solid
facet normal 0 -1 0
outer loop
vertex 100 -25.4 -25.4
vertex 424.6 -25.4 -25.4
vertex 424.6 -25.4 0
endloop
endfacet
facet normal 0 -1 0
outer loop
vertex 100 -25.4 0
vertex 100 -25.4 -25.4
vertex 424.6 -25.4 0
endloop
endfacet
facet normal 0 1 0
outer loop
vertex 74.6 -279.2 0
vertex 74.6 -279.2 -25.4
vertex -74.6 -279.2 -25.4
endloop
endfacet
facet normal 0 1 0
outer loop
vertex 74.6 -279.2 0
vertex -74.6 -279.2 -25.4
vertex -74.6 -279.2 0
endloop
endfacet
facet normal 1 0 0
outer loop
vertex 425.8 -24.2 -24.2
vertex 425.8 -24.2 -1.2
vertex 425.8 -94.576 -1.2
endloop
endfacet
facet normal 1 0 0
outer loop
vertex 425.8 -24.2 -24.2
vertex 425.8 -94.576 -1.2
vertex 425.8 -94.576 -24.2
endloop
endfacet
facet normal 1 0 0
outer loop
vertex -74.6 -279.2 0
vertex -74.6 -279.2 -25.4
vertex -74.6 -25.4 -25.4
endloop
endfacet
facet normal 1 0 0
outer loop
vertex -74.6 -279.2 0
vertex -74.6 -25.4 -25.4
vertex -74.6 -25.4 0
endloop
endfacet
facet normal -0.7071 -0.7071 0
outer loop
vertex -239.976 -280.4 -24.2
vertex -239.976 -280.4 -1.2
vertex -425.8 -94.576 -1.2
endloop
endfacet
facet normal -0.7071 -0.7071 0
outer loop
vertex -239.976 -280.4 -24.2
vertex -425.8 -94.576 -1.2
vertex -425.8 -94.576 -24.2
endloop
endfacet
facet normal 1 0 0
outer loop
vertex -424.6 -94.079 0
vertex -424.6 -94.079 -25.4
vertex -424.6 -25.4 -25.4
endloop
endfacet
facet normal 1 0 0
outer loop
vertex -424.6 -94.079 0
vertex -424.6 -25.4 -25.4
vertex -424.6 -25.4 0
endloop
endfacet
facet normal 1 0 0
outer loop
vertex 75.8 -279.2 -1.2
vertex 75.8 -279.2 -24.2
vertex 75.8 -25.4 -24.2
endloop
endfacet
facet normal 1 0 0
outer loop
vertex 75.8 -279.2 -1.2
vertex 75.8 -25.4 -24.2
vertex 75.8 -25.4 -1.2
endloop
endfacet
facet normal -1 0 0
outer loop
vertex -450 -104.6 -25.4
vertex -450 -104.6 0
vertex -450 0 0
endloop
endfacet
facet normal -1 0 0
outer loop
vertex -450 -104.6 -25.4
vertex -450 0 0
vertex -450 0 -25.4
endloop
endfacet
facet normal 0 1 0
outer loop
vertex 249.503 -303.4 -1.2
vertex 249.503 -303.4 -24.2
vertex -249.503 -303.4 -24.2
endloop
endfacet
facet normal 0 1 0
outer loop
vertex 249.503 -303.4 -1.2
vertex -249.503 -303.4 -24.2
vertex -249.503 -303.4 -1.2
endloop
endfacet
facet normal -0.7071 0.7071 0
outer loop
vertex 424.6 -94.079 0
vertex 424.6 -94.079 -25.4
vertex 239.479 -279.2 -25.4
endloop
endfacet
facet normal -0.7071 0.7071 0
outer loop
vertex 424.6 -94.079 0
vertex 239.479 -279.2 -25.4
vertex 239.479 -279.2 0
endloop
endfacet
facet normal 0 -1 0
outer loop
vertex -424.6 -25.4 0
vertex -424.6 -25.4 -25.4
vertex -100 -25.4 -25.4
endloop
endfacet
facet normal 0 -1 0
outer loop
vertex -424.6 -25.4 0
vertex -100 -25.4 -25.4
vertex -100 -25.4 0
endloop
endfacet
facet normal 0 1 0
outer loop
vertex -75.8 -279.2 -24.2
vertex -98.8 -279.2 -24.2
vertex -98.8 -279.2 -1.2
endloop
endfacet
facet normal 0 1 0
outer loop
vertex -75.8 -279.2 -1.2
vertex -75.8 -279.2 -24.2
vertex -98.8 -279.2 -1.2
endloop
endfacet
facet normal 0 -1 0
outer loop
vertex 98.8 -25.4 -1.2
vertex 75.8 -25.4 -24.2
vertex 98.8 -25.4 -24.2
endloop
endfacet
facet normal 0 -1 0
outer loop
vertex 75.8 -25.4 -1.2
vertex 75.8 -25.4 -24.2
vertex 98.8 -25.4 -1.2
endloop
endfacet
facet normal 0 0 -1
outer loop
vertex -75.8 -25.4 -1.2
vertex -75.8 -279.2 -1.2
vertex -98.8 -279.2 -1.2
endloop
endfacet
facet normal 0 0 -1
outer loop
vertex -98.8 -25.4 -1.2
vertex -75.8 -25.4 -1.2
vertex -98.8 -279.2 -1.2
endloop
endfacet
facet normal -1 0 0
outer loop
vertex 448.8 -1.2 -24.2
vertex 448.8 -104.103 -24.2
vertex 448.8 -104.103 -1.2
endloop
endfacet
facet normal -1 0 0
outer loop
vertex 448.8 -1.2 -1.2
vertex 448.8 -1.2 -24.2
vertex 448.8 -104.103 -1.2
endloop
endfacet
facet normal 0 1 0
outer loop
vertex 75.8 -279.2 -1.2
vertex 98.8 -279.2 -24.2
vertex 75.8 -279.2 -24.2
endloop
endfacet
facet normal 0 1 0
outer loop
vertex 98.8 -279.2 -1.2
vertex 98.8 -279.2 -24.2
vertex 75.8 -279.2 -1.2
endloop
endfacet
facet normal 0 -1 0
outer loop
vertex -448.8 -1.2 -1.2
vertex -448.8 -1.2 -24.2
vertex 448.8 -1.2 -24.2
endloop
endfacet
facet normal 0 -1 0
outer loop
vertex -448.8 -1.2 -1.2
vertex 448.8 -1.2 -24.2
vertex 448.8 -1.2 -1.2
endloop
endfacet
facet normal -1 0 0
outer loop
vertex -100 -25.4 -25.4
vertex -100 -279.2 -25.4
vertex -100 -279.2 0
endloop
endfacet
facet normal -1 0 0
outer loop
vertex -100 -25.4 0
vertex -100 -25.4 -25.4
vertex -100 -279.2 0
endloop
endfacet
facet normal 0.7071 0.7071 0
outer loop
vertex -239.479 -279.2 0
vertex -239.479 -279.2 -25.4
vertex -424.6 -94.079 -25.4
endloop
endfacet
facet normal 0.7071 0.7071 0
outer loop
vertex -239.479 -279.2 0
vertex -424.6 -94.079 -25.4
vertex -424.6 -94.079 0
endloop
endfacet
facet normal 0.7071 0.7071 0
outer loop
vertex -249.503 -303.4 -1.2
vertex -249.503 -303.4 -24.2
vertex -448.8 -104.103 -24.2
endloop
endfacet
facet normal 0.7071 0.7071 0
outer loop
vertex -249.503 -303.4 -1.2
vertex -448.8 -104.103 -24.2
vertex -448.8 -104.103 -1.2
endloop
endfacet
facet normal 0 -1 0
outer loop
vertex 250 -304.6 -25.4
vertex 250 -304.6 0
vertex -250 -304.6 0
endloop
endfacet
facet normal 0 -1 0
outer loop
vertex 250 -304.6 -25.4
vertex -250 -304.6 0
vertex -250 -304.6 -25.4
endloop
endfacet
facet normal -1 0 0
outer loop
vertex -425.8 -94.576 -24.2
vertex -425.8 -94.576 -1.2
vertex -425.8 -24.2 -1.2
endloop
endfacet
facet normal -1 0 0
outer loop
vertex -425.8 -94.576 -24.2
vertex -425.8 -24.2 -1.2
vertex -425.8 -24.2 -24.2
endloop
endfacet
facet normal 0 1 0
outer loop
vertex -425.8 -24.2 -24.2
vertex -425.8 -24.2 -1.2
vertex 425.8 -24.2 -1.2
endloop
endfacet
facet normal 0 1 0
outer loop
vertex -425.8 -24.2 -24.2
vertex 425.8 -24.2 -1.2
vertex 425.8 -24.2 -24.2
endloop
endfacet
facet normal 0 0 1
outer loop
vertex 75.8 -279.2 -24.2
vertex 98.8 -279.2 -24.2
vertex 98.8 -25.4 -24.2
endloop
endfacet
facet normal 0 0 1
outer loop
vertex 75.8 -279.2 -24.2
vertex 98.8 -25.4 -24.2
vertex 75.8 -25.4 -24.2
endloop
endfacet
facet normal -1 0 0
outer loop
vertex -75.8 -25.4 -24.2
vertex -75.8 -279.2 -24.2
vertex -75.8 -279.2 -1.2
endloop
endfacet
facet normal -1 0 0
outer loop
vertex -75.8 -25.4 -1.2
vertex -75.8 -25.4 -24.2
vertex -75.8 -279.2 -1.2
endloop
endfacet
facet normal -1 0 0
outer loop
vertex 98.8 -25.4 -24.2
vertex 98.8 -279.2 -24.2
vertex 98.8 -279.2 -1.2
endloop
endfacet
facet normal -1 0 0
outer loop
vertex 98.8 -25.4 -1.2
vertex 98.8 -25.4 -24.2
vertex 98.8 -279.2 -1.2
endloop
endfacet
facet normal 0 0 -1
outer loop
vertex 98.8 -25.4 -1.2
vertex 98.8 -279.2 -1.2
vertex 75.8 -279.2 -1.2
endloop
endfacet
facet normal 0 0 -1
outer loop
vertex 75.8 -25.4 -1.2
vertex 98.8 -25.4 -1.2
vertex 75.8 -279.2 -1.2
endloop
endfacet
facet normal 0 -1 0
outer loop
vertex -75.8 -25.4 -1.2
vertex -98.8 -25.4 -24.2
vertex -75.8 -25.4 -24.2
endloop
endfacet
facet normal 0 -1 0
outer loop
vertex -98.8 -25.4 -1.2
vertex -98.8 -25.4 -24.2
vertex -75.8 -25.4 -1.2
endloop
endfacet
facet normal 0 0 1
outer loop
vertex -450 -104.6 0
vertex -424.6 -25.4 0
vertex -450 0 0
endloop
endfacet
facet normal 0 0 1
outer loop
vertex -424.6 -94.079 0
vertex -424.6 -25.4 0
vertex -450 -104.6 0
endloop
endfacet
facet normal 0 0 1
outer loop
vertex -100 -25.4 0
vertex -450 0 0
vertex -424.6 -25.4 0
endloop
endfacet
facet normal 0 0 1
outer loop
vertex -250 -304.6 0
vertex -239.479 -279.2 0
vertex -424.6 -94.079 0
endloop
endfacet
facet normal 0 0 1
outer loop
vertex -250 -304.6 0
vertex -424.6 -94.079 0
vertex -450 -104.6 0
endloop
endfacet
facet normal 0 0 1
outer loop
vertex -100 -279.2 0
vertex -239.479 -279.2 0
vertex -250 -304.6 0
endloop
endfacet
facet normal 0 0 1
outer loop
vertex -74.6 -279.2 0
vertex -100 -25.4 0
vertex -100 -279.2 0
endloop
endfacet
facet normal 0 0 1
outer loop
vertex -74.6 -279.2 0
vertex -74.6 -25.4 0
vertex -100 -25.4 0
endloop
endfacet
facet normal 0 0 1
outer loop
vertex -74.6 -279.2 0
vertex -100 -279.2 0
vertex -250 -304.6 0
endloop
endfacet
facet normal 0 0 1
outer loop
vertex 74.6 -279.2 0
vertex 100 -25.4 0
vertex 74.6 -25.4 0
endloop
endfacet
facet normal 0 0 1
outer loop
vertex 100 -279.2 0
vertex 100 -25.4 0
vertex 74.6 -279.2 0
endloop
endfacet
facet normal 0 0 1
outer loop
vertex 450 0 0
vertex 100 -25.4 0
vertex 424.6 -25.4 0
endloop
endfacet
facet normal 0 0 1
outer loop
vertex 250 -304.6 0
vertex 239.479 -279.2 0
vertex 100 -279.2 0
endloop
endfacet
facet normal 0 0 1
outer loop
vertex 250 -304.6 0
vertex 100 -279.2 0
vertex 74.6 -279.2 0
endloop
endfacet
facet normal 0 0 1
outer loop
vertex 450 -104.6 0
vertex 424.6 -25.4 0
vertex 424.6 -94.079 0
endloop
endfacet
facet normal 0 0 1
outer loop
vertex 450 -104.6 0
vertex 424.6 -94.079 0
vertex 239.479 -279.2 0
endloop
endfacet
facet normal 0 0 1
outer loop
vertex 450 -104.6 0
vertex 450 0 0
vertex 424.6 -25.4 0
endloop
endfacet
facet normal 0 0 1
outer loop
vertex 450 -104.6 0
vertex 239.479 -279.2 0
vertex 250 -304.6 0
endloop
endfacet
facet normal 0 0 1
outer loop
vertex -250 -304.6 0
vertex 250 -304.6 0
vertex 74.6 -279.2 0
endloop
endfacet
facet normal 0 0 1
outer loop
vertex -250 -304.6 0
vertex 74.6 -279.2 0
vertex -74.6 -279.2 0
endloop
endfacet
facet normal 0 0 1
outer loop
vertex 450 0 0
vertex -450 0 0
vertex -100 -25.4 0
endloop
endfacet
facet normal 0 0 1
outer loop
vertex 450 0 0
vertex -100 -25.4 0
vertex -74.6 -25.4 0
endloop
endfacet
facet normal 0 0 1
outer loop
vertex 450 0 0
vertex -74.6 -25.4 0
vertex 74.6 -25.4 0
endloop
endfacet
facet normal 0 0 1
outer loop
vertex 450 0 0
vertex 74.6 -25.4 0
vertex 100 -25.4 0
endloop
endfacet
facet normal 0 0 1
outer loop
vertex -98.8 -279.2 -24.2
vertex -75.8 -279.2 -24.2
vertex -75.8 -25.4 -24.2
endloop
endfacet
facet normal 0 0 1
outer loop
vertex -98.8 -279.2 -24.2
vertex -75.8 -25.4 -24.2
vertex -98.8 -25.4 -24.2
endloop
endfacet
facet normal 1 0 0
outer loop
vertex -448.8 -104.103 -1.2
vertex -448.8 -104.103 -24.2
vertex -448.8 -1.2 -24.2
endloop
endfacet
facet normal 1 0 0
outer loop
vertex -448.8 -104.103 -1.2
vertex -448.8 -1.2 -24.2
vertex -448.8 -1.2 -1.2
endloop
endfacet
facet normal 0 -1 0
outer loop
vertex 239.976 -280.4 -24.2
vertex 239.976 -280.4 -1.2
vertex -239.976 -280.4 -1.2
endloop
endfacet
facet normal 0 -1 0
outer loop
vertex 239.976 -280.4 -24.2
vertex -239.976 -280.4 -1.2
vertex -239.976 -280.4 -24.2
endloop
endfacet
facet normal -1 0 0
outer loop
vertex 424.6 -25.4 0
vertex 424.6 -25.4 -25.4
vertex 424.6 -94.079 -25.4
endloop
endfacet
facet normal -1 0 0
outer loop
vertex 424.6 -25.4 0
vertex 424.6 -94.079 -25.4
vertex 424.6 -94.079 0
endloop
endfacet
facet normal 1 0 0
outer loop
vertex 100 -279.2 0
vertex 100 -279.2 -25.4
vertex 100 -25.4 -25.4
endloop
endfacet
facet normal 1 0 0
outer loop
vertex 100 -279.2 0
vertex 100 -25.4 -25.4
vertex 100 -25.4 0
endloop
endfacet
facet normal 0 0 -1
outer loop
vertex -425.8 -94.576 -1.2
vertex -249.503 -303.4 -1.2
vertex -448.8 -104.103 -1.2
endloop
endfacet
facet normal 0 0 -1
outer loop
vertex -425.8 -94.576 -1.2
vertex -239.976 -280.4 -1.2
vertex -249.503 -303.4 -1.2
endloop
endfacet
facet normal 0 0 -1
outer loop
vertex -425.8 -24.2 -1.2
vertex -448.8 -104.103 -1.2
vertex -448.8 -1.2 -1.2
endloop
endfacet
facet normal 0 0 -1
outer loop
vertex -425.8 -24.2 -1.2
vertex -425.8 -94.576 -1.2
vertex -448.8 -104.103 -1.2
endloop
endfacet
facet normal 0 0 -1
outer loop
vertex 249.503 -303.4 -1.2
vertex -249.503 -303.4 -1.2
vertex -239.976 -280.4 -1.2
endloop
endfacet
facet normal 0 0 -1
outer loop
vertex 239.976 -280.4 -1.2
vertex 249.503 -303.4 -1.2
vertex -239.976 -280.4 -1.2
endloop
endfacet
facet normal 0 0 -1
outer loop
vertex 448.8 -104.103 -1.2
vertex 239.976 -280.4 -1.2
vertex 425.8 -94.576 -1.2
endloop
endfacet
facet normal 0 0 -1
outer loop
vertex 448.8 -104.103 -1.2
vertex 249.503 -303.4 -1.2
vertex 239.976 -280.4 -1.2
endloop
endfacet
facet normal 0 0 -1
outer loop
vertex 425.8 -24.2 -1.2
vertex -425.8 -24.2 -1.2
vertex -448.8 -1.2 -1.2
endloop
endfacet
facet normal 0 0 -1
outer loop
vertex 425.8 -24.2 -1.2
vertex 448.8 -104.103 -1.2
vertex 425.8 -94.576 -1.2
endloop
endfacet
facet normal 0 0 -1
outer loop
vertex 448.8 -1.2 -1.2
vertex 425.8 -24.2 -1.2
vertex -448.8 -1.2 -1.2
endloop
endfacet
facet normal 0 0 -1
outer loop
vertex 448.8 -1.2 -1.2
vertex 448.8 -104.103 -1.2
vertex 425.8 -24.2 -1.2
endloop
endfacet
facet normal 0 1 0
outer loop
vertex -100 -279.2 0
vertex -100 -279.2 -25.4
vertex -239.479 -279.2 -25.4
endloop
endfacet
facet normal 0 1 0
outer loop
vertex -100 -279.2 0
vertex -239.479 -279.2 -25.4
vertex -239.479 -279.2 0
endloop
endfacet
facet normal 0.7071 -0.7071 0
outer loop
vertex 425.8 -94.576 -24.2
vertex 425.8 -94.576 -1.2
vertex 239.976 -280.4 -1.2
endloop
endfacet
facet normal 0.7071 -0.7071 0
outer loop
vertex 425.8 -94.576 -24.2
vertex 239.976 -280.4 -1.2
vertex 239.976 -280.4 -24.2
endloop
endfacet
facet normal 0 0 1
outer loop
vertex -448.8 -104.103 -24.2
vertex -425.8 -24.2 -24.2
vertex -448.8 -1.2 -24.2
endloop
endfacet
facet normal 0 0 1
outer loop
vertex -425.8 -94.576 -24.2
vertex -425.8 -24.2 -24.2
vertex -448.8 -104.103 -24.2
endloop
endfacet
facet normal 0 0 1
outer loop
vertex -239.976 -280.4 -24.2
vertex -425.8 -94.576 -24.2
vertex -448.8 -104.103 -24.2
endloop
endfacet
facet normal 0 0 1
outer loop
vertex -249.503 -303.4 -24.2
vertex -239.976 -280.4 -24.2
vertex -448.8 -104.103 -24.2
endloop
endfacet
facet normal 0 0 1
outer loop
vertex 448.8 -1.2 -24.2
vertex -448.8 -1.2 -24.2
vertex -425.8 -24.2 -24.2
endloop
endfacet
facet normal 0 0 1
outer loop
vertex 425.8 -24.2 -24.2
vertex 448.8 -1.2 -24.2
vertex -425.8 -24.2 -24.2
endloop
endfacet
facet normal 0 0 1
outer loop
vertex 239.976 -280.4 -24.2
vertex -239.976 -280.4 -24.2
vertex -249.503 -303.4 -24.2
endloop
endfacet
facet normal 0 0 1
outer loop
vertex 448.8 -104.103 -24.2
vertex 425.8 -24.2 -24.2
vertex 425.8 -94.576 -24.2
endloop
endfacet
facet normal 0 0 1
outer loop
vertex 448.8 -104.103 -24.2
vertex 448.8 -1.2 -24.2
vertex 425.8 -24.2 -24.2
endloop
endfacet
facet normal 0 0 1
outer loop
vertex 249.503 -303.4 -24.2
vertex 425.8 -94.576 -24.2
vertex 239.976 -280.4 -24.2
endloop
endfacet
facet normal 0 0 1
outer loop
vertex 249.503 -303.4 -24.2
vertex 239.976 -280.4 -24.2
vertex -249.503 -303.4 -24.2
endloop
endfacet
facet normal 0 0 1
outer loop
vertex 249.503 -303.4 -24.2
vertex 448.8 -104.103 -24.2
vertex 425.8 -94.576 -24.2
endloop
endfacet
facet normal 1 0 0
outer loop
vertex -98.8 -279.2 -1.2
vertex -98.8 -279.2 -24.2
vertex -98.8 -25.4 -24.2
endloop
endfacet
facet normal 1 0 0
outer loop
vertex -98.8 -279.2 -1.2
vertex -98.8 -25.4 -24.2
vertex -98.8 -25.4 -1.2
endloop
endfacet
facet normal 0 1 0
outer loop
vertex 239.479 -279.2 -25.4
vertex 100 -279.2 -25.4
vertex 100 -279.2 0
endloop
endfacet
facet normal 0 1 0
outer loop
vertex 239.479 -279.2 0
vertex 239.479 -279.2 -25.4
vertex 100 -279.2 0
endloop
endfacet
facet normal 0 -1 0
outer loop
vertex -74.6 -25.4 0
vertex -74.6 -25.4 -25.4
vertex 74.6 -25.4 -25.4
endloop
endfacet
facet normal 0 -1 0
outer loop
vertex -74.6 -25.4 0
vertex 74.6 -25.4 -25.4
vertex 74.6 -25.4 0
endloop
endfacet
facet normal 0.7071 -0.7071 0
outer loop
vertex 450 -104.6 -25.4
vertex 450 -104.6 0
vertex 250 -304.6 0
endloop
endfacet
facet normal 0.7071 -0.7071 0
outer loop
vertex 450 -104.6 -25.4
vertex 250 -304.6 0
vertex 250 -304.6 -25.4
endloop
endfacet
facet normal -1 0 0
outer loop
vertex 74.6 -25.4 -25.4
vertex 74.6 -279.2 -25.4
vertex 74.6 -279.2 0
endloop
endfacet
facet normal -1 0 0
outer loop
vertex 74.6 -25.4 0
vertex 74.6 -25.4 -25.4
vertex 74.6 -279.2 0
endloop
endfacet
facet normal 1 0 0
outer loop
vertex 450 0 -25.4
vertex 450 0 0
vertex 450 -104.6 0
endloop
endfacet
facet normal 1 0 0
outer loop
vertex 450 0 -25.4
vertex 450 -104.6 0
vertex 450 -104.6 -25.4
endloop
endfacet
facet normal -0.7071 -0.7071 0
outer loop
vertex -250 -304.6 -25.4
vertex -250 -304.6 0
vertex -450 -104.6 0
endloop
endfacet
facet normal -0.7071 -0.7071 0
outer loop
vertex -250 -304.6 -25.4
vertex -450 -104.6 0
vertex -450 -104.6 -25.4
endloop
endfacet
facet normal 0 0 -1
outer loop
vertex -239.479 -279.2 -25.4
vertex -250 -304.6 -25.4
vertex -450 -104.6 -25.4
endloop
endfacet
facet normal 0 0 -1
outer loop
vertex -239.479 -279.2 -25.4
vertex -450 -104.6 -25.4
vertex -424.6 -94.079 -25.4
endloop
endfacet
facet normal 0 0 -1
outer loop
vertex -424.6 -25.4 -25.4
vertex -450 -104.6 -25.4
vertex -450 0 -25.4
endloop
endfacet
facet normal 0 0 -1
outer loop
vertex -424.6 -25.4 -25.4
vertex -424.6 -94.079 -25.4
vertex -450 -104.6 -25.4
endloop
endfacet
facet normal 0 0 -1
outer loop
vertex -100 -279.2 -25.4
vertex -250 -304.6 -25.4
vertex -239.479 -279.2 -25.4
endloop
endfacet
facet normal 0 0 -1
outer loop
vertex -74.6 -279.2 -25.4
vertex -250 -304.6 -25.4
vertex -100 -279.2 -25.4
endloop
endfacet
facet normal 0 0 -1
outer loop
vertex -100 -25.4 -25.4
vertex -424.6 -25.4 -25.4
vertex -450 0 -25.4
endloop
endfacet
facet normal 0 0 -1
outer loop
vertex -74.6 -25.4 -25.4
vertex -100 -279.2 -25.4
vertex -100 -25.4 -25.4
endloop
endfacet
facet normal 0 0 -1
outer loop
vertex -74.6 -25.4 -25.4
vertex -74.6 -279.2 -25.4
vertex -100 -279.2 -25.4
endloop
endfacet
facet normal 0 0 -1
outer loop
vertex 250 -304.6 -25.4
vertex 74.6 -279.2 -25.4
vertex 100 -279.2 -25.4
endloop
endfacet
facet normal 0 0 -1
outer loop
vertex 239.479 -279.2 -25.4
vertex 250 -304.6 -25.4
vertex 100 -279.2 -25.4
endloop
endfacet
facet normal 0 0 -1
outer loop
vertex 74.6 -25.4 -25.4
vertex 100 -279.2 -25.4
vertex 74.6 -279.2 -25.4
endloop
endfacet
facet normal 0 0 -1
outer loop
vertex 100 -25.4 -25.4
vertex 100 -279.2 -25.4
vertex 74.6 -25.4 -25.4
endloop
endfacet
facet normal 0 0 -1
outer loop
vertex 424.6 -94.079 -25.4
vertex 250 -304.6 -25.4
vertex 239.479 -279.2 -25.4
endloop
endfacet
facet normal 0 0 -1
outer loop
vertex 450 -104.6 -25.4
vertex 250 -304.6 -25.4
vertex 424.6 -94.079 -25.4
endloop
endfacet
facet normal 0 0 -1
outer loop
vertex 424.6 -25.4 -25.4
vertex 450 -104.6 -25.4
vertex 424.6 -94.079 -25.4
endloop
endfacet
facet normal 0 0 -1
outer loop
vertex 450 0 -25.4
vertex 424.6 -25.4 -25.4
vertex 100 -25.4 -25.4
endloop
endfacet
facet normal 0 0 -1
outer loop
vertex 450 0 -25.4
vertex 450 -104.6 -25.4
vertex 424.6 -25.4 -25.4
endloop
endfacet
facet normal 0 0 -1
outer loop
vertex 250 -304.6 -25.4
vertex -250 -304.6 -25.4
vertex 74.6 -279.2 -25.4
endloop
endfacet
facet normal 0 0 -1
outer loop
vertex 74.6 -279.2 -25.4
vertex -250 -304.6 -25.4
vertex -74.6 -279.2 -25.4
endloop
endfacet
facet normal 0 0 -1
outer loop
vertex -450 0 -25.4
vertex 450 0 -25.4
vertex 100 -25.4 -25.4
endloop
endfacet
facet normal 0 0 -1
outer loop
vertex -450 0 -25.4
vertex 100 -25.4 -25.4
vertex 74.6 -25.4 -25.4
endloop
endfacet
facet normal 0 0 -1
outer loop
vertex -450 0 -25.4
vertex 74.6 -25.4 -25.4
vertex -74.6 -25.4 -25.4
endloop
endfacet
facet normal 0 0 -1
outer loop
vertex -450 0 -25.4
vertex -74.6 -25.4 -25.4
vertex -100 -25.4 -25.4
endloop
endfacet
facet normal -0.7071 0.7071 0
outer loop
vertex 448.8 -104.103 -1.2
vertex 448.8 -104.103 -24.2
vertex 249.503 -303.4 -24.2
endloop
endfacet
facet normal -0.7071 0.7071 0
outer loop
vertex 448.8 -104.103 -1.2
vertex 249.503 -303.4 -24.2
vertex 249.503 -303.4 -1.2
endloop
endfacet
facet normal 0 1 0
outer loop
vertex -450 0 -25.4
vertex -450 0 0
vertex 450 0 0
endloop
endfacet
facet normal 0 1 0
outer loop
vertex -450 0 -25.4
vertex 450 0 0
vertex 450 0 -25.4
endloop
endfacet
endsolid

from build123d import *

# Parameters (mm, degrees)
SKETCH4_W           = 25.4
SKETCH4_H           = 25.4
SKETCH4_W_2         = 23
SKETCH4_H_2         = 23
SKETCH5_W           = 25.4
SKETCH5_H           = 25.4
SKETCH5_W_2         = 23
SKETCH5_H_2         = 23
BOSS_EXTRUDE2_DEPTH = 253.8


with BuildPart() as part:
    # Sweep1: sweep along a path in Sketch3
    with BuildLine(Plane.XY) as sweep1_path:
        Line((-250, -304.6), (250, -304.6))
        Line((250, -304.6), (450, -104.6))
        Line((450, -104.6), (450, 0))
        Line((450, 0), (-450, 0))
        Line((-450, 0), (-450, -104.6))
        Line((-450, -104.6), (-250, -304.6))
    # Sketch4 → Sweep1 (sweep)
    with BuildSketch(Plane(origin=(0, 0, 0), x_dir=(0, 0, -1), z_dir=(1, 0, 0))):
        with Locations((12.7, -291.9)):
            Rectangle(SKETCH4_W, SKETCH4_H)
        with Locations((12.7, -291.9)):
            Rectangle(SKETCH4_W_2, SKETCH4_H_2, mode=Mode.SUBTRACT)
    sweep(path=sweep1_path.line, transition=Transition.RIGHT)

    # Sketch5 → Boss-Extrude2 (add)
    with BuildSketch(Plane(origin=(-272.712994231, -279.2, 0), x_dir=(-1, 0, 0), z_dir=(0, 1, 0))):
        with Locations((-360.012994231, -12.7)):
            Rectangle(SKETCH5_W, SKETCH5_H)
        with Locations((-360.012994231, -12.7)):
            Rectangle(SKETCH5_W_2, SKETCH5_H_2, mode=Mode.SUBTRACT)
        with Locations((-185.412994231, -12.7)):
            Rectangle(SKETCH5_W, SKETCH5_H)
        with Locations((-185.412994231, -12.7)):
            Rectangle(SKETCH5_W_2, SKETCH5_H_2, mode=Mode.SUBTRACT)
    extrude(amount=BOSS_EXTRUDE2_DEPTH)


solid = part.part
